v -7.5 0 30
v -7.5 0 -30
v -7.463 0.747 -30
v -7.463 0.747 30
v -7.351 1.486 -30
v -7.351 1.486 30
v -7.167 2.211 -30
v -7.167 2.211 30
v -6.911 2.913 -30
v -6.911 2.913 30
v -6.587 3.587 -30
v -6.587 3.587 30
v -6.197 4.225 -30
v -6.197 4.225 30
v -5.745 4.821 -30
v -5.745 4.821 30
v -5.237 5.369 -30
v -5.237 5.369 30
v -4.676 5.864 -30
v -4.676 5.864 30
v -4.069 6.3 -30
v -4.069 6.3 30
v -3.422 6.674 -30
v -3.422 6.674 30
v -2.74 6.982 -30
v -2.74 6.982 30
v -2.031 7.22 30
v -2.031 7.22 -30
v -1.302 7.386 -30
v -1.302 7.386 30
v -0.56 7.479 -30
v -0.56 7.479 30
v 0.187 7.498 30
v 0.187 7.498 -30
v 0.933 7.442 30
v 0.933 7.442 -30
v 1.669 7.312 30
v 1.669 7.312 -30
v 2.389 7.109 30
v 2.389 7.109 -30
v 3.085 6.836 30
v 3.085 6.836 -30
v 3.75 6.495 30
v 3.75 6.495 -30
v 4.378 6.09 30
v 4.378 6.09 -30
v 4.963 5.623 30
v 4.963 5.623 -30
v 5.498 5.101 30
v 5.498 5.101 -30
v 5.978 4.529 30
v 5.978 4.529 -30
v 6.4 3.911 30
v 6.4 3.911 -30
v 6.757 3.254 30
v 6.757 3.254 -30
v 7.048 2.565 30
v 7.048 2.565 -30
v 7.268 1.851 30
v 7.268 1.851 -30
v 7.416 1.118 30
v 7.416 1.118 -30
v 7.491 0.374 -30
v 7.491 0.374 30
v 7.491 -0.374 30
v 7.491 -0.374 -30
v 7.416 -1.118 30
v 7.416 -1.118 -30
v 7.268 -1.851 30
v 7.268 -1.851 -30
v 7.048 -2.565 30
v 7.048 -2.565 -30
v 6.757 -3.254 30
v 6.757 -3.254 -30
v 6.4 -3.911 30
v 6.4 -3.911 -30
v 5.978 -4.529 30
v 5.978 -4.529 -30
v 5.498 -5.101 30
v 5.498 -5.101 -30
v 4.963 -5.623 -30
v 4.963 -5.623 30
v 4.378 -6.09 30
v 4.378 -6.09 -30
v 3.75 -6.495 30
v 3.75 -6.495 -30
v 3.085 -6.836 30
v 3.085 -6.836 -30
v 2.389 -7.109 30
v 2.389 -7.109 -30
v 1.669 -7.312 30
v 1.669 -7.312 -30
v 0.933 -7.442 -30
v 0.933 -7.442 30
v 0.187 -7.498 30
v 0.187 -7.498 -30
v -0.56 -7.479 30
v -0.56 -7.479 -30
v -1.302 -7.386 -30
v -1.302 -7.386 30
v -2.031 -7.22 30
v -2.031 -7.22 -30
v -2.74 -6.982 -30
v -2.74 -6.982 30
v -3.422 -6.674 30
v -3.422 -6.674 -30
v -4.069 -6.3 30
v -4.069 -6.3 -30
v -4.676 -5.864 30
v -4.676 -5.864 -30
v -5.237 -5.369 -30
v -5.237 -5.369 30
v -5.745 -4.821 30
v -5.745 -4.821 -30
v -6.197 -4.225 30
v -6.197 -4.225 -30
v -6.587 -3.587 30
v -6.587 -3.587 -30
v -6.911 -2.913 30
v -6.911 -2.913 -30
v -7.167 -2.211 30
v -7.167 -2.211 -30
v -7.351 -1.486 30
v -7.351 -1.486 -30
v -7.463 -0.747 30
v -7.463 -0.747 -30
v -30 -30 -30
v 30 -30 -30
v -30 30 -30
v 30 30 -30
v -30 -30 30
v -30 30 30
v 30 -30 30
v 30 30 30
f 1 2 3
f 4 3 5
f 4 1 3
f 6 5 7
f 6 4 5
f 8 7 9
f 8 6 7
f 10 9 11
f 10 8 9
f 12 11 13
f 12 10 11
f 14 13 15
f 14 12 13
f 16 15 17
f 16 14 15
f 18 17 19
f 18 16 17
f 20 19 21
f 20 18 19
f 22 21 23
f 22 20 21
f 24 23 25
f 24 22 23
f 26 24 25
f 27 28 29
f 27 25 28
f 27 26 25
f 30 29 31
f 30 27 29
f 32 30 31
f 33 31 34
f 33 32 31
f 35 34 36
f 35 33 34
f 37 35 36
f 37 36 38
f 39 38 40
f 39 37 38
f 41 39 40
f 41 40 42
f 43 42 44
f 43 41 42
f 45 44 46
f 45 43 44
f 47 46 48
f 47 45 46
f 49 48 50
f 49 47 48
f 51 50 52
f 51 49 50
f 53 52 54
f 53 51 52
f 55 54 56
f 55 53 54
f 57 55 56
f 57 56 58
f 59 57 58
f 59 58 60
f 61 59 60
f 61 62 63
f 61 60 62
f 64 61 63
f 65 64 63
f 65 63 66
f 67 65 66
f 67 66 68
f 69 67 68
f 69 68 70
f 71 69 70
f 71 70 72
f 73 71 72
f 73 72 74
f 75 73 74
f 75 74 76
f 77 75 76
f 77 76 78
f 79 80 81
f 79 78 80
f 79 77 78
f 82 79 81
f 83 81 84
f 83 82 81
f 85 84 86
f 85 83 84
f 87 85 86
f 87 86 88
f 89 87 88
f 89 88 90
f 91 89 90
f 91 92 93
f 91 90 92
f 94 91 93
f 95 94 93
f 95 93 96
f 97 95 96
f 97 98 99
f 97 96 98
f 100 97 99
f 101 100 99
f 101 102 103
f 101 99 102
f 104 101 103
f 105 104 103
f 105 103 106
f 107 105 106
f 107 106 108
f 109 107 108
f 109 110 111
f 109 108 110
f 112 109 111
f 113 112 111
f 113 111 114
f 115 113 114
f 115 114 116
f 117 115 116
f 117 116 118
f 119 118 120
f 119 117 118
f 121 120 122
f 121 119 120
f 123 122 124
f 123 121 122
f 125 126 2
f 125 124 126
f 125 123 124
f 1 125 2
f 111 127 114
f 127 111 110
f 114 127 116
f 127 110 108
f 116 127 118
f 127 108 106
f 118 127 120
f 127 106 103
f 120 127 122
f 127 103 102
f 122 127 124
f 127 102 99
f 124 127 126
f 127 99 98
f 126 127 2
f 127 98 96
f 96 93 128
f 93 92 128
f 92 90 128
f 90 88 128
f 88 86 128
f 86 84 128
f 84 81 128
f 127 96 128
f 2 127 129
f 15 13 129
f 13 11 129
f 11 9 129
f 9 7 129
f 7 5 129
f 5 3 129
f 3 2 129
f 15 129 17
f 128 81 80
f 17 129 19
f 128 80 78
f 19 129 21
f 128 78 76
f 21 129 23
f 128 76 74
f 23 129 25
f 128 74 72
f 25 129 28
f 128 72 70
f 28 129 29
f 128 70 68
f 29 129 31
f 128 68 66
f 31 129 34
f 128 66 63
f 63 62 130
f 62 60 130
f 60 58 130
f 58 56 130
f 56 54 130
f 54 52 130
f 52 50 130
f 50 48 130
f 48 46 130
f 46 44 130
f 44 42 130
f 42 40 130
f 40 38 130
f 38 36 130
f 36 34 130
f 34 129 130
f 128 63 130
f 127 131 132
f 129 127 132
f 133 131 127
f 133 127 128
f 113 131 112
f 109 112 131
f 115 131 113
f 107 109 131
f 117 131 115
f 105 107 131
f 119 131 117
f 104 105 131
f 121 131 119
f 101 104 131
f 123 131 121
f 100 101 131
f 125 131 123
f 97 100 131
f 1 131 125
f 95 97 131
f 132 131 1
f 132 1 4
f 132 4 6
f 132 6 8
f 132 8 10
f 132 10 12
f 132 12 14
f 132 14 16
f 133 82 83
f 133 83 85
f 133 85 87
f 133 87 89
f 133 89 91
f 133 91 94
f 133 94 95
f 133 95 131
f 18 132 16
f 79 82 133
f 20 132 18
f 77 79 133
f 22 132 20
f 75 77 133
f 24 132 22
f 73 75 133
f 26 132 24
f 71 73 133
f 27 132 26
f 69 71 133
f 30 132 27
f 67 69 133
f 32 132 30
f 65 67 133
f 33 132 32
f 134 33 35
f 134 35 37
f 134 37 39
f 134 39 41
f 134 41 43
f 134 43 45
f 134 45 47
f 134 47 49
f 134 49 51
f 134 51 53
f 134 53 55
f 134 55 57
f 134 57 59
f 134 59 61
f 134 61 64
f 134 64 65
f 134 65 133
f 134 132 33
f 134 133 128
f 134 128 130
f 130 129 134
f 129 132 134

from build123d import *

# Parameters (mm, degrees)
SKETCH_1_W          = 60
SKETCH_1_H          = 60
EXTRUDE_1_DEPTH     = 30
SKETCH_2_R          = 7.5
CUT_EXTRUDE_1_DEPTH = 74.484692283


with BuildPart() as part:
    # 草图1 → 凸台-拉伸1 (new, symmetric)
    with BuildSketch(Plane.XY):
        Rectangle(SKETCH_1_W, SKETCH_1_H)
    extrude(amount=EXTRUDE_1_DEPTH, both=True)

    # 草图2 → 切除-拉伸1 (cut, through all)
    with BuildSketch(Plane(origin=(0, 0, 30), x_dir=(-1, 0, 0), z_dir=(0, 0, -1))):
        Circle(SKETCH_2_R)
    extrude(amount=CUT_EXTRUDE_1_DEPTH, mode=Mode.SUBTRACT)


solid = part.part
